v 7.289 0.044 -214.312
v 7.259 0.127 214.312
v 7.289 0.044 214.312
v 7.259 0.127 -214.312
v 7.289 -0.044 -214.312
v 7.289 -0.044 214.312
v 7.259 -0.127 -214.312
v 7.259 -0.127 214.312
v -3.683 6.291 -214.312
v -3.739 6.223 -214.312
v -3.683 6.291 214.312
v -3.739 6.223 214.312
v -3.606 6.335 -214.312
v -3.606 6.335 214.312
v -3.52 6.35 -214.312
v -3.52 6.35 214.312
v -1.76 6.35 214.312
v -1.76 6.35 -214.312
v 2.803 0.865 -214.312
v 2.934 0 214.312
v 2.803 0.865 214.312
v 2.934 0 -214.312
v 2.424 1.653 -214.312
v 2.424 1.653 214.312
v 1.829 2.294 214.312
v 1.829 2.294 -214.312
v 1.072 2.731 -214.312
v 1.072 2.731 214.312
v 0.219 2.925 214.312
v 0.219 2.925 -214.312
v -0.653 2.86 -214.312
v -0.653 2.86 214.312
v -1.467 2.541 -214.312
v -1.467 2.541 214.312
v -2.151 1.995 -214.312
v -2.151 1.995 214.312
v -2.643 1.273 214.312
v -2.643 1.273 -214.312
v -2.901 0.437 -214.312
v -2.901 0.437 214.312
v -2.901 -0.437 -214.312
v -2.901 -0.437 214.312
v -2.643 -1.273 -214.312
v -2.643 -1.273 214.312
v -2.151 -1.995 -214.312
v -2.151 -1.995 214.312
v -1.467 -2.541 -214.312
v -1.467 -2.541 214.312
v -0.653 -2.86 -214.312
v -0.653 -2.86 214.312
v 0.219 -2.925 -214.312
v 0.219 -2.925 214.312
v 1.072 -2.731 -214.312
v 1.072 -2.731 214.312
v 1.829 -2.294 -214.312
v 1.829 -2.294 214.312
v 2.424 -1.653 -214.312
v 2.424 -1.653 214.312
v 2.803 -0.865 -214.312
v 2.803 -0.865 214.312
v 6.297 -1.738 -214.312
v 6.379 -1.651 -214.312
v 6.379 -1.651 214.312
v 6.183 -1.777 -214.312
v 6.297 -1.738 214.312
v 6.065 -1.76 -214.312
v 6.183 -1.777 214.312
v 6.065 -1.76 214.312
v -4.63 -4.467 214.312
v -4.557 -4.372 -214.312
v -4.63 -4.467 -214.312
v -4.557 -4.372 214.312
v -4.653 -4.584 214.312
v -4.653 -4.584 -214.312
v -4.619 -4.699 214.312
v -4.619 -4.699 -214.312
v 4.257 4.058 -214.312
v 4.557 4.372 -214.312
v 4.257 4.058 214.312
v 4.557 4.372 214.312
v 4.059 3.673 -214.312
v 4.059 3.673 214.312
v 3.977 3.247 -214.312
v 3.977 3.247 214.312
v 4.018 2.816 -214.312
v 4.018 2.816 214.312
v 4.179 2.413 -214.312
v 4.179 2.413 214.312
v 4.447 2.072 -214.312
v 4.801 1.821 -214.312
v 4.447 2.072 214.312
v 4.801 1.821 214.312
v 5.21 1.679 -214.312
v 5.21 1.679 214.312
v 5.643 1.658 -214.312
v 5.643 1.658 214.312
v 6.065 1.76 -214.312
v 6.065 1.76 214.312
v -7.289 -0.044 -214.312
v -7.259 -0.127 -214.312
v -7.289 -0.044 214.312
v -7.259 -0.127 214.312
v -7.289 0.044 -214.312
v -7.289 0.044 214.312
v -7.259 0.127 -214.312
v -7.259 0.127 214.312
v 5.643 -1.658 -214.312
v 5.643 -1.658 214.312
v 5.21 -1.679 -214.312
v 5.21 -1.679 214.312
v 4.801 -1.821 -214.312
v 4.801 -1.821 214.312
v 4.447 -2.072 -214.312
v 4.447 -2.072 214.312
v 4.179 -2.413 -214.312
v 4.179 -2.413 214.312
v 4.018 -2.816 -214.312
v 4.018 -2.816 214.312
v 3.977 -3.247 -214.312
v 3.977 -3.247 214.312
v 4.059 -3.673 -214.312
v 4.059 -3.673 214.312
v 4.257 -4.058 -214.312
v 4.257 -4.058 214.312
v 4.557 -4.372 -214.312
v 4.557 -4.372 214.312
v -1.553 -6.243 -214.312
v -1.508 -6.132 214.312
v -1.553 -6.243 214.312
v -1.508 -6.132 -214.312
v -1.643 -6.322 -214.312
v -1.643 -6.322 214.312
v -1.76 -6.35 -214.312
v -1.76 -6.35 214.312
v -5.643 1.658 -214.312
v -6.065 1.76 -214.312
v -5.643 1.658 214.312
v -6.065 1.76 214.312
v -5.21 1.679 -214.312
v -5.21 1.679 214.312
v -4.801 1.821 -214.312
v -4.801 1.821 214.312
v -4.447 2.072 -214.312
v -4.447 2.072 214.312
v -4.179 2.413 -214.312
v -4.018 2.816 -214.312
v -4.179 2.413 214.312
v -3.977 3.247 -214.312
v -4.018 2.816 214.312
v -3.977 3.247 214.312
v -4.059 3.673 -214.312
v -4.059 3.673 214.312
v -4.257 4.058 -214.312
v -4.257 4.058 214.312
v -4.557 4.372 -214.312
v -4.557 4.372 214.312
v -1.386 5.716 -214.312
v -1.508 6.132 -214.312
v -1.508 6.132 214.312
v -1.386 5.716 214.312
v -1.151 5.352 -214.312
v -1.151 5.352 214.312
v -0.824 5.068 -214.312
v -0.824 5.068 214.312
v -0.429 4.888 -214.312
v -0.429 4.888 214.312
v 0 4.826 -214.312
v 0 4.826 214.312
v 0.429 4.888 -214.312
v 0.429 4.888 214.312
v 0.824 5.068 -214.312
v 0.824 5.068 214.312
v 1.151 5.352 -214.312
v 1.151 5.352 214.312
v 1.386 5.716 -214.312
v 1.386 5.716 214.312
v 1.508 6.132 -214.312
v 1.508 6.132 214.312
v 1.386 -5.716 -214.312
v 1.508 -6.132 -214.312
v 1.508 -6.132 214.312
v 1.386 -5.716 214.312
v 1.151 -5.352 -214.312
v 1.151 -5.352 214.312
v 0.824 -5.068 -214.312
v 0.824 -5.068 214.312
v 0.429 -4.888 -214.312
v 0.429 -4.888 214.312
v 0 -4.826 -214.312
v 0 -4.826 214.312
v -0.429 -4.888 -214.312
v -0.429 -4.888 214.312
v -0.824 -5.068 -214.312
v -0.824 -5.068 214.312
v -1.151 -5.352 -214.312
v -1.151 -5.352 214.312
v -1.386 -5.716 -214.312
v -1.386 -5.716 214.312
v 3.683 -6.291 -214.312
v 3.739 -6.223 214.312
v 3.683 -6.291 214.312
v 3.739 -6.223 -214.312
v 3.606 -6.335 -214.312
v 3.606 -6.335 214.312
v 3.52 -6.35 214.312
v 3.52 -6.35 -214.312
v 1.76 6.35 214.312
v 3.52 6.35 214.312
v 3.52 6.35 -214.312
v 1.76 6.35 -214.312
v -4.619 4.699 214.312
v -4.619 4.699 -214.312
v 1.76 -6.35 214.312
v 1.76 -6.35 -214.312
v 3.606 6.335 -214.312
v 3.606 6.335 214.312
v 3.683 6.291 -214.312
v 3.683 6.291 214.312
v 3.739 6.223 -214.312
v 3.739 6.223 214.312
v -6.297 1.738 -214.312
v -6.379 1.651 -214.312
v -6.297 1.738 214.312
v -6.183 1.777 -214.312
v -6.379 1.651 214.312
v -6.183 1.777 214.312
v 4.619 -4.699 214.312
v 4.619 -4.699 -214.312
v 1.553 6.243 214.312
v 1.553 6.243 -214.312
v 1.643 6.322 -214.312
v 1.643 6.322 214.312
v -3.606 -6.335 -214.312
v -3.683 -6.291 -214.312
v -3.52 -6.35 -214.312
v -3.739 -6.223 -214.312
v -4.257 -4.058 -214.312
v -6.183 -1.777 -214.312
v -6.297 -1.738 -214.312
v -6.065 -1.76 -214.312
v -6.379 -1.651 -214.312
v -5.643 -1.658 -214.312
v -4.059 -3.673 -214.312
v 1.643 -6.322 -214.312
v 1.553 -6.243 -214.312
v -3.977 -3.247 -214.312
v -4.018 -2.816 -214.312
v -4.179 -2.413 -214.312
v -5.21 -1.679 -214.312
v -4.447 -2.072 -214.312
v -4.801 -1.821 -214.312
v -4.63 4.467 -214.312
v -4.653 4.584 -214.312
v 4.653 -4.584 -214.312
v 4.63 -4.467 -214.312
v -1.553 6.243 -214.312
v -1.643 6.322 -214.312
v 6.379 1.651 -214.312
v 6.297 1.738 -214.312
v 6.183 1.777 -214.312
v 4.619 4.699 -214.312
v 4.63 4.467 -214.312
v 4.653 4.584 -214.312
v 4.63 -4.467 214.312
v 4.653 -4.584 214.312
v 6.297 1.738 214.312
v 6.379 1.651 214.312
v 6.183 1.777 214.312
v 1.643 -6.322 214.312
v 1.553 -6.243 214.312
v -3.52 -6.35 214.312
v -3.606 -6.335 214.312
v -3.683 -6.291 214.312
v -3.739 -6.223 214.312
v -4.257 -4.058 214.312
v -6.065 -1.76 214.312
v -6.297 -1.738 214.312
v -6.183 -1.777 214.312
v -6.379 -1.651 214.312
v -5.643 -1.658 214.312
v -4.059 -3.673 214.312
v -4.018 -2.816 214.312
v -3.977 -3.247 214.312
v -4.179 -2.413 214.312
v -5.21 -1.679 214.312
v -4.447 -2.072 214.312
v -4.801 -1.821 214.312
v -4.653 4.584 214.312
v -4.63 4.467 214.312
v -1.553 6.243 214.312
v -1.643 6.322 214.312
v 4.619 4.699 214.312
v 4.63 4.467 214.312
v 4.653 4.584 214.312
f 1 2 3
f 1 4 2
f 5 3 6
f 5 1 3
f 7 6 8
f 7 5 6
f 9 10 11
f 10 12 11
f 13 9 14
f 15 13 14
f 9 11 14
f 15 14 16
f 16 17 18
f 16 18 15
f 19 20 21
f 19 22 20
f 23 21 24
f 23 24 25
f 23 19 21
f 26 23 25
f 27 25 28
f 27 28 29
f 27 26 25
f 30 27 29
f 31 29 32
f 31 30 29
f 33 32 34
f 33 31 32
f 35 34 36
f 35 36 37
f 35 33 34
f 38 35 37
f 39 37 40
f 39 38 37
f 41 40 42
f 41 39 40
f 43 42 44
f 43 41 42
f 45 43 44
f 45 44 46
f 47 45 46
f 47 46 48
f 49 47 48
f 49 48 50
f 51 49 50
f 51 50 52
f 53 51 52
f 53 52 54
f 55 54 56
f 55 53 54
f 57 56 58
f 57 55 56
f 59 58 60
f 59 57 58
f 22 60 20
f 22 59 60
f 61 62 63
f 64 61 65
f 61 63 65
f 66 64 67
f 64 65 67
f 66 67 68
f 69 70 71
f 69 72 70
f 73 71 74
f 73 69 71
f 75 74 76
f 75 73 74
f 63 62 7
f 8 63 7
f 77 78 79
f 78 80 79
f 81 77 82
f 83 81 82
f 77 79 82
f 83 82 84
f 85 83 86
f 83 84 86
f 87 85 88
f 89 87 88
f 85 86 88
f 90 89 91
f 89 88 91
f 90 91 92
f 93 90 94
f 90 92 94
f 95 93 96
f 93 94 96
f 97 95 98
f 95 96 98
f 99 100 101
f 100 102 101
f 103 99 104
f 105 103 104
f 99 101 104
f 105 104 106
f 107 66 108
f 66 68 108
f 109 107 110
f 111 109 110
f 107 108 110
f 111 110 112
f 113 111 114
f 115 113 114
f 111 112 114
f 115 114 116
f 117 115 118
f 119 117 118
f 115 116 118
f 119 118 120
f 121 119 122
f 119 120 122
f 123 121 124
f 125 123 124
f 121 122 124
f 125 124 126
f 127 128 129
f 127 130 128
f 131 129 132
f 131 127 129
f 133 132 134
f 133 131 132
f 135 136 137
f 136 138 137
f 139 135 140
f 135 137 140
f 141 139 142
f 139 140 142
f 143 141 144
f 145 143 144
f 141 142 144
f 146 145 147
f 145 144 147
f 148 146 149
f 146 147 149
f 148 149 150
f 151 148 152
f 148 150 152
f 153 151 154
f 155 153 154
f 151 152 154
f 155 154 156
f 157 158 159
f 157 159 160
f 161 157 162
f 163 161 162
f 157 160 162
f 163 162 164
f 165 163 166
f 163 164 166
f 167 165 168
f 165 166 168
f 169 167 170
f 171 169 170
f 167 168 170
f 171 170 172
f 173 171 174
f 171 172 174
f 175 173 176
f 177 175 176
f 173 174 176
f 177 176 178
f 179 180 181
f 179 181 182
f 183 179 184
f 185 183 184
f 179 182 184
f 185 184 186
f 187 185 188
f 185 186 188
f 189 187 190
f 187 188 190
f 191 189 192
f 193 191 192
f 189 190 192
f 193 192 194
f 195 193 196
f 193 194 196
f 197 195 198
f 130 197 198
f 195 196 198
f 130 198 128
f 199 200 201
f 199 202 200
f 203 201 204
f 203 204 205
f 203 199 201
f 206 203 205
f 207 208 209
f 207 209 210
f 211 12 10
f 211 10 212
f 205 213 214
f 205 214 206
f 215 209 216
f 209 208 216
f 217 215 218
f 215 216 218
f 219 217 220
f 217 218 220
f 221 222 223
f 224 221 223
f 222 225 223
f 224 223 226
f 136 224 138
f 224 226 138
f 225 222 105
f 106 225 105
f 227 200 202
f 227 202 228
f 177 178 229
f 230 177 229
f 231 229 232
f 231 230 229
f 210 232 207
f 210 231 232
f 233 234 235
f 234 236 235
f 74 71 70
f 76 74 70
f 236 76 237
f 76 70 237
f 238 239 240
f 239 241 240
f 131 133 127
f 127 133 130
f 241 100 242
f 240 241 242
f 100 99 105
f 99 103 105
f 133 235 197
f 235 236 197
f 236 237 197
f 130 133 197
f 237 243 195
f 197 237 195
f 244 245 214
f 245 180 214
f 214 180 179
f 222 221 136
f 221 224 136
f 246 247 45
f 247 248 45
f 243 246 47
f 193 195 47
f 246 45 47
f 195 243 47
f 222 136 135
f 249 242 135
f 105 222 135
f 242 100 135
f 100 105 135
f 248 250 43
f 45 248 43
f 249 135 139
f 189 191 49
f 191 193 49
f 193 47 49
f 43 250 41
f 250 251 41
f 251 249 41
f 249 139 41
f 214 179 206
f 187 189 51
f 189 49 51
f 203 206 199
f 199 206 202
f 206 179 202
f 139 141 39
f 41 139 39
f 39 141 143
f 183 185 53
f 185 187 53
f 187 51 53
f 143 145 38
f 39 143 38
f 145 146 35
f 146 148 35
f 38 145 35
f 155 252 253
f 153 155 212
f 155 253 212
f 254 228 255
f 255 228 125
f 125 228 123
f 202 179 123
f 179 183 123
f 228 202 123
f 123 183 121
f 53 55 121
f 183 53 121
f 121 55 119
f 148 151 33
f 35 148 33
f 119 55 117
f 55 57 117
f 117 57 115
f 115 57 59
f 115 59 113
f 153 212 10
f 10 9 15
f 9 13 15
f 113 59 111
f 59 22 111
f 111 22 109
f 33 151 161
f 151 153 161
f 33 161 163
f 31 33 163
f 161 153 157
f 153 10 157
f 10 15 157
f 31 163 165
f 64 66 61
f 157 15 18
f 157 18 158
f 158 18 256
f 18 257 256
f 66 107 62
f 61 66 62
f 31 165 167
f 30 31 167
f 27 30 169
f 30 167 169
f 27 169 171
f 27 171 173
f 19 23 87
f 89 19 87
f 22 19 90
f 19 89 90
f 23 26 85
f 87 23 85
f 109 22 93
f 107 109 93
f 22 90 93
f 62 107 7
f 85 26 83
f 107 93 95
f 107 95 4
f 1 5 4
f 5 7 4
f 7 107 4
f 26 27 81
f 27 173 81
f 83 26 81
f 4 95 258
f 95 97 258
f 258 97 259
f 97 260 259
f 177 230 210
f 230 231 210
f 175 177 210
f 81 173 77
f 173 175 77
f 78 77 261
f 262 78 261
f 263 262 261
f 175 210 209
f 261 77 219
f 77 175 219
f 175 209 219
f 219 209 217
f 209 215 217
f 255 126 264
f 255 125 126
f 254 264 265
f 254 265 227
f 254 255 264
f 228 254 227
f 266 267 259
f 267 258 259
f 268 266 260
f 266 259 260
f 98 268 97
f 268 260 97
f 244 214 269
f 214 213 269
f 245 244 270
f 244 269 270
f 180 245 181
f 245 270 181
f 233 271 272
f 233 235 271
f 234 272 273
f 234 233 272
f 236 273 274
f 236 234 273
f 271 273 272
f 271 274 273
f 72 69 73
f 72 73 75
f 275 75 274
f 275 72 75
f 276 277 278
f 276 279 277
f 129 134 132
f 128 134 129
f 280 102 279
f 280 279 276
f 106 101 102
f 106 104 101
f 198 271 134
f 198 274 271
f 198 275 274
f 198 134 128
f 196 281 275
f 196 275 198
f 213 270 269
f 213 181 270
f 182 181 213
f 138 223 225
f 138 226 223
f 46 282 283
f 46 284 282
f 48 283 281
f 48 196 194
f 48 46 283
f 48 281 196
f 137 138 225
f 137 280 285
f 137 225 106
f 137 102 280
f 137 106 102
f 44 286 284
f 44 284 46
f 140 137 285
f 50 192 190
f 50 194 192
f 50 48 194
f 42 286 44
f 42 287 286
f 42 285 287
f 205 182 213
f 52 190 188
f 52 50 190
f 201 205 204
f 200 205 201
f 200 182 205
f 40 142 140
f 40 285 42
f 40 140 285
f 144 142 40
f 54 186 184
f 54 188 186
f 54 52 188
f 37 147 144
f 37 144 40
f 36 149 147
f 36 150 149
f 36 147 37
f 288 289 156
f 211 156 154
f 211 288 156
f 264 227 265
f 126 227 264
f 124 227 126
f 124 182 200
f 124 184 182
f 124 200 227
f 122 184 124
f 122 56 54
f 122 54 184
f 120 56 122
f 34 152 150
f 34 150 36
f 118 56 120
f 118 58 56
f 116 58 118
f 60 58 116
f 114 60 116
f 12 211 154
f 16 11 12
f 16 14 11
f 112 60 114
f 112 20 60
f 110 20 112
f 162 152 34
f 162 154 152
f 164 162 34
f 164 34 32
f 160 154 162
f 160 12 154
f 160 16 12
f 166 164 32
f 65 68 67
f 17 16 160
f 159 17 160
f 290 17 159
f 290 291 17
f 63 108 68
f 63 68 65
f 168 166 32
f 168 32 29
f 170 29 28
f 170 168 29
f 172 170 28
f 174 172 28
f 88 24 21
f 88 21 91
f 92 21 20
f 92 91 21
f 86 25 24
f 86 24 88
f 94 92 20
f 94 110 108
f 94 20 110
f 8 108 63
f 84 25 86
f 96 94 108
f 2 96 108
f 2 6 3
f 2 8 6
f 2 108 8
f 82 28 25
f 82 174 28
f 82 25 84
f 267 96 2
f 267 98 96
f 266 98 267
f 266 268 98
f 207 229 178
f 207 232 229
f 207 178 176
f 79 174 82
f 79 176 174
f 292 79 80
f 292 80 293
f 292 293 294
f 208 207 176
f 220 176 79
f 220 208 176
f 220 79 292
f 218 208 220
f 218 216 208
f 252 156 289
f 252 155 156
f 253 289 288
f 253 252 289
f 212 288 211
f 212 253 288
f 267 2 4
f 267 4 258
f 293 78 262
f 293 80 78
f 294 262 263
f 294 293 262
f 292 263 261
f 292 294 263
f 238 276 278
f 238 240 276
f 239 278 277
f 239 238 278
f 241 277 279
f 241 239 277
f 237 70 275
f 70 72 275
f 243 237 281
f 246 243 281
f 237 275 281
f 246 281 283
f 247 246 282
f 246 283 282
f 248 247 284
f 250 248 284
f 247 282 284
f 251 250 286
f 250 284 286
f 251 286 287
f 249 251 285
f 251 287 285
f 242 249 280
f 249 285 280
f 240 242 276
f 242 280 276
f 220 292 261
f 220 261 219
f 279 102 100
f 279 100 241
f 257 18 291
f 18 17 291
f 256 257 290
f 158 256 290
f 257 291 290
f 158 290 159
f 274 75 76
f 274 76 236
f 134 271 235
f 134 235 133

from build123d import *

# Parameters (mm, degrees)
SKETCH1_R         = 2.9337
EXTRUDE1_DEPTH    = 214.3125
SKETCH5_R         = 1.524
EXTRUDE2_DEPTH    = 429.625
CIRPATTERN2_COUNT = 6
FILLET1_R         = 0.254


with BuildPart() as part:
    # Sketch1 → Extrude1 (new body, symmetric)
    with BuildSketch(Plane.XY):
        Polygon((7.332348419, 0), (3.666174209, 6.35), (-3.666174209, 6.35), (-7.332348419, 0), (-3.666174209, -6.35), (3.666174209, -6.35), align=None)
        Circle(SKETCH1_R, mode=Mode.SUBTRACT)
    extrude(amount=EXTRUDE1_DEPTH, both=True)

    # Sketch5 → Extrude2 (cut, through all)
    with BuildSketch(Plane.XY.offset(214.3125)):
        with Locations((0, 6.35)):
            Circle(SKETCH5_R)
    extrude2 = extrude(amount=-EXTRUDE2_DEPTH, mode=Mode.SUBTRACT)

    # CirPattern2: Extrude2 ×6 about axis
    cirpattern2_axis = Axis((0, 0, 0), (0, 0, 1))
    for i in range(1, CIRPATTERN2_COUNT):
        add(extrude2.rotate(cirpattern2_axis, i * 360 / CIRPATTERN2_COUNT), mode=Mode.SUBTRACT)

    # Fillet1
    fillet1_edges = [part.edges().sort_by_distance(p)[0] for p in [
        (3.666174209, -6.35, 0),
        (-3.666174209, -6.35, 0),
        (-7.332348419, 0, 0),
        (-3.666174209, 6.35, 0),
        (3.666174209, 6.35, 0),
        (7.332348419, 0, 0),
        (-1.524, 6.35, 0),
        (1.524, 6.35, 0),
        (-6.261261314, 1.855177285, 0),
        (-4.737261314, 4.494822715, 0),
        (-4.737261314, -4.494822715, 0),
        (-6.261261314, -1.855177285, 0),
        (1.524, -6.35, 0),
        (-1.524, -6.35, 0),
        (6.261261314, -1.855177285, 0),
        (4.737261314, -4.494822715, 0),
        (4.737261314, 4.494822715, 0),
        (6.261261314, 1.855177285, 0),
    ]]
    fillet(fillet1_edges, radius=FILLET1_R)


solid = part.part
